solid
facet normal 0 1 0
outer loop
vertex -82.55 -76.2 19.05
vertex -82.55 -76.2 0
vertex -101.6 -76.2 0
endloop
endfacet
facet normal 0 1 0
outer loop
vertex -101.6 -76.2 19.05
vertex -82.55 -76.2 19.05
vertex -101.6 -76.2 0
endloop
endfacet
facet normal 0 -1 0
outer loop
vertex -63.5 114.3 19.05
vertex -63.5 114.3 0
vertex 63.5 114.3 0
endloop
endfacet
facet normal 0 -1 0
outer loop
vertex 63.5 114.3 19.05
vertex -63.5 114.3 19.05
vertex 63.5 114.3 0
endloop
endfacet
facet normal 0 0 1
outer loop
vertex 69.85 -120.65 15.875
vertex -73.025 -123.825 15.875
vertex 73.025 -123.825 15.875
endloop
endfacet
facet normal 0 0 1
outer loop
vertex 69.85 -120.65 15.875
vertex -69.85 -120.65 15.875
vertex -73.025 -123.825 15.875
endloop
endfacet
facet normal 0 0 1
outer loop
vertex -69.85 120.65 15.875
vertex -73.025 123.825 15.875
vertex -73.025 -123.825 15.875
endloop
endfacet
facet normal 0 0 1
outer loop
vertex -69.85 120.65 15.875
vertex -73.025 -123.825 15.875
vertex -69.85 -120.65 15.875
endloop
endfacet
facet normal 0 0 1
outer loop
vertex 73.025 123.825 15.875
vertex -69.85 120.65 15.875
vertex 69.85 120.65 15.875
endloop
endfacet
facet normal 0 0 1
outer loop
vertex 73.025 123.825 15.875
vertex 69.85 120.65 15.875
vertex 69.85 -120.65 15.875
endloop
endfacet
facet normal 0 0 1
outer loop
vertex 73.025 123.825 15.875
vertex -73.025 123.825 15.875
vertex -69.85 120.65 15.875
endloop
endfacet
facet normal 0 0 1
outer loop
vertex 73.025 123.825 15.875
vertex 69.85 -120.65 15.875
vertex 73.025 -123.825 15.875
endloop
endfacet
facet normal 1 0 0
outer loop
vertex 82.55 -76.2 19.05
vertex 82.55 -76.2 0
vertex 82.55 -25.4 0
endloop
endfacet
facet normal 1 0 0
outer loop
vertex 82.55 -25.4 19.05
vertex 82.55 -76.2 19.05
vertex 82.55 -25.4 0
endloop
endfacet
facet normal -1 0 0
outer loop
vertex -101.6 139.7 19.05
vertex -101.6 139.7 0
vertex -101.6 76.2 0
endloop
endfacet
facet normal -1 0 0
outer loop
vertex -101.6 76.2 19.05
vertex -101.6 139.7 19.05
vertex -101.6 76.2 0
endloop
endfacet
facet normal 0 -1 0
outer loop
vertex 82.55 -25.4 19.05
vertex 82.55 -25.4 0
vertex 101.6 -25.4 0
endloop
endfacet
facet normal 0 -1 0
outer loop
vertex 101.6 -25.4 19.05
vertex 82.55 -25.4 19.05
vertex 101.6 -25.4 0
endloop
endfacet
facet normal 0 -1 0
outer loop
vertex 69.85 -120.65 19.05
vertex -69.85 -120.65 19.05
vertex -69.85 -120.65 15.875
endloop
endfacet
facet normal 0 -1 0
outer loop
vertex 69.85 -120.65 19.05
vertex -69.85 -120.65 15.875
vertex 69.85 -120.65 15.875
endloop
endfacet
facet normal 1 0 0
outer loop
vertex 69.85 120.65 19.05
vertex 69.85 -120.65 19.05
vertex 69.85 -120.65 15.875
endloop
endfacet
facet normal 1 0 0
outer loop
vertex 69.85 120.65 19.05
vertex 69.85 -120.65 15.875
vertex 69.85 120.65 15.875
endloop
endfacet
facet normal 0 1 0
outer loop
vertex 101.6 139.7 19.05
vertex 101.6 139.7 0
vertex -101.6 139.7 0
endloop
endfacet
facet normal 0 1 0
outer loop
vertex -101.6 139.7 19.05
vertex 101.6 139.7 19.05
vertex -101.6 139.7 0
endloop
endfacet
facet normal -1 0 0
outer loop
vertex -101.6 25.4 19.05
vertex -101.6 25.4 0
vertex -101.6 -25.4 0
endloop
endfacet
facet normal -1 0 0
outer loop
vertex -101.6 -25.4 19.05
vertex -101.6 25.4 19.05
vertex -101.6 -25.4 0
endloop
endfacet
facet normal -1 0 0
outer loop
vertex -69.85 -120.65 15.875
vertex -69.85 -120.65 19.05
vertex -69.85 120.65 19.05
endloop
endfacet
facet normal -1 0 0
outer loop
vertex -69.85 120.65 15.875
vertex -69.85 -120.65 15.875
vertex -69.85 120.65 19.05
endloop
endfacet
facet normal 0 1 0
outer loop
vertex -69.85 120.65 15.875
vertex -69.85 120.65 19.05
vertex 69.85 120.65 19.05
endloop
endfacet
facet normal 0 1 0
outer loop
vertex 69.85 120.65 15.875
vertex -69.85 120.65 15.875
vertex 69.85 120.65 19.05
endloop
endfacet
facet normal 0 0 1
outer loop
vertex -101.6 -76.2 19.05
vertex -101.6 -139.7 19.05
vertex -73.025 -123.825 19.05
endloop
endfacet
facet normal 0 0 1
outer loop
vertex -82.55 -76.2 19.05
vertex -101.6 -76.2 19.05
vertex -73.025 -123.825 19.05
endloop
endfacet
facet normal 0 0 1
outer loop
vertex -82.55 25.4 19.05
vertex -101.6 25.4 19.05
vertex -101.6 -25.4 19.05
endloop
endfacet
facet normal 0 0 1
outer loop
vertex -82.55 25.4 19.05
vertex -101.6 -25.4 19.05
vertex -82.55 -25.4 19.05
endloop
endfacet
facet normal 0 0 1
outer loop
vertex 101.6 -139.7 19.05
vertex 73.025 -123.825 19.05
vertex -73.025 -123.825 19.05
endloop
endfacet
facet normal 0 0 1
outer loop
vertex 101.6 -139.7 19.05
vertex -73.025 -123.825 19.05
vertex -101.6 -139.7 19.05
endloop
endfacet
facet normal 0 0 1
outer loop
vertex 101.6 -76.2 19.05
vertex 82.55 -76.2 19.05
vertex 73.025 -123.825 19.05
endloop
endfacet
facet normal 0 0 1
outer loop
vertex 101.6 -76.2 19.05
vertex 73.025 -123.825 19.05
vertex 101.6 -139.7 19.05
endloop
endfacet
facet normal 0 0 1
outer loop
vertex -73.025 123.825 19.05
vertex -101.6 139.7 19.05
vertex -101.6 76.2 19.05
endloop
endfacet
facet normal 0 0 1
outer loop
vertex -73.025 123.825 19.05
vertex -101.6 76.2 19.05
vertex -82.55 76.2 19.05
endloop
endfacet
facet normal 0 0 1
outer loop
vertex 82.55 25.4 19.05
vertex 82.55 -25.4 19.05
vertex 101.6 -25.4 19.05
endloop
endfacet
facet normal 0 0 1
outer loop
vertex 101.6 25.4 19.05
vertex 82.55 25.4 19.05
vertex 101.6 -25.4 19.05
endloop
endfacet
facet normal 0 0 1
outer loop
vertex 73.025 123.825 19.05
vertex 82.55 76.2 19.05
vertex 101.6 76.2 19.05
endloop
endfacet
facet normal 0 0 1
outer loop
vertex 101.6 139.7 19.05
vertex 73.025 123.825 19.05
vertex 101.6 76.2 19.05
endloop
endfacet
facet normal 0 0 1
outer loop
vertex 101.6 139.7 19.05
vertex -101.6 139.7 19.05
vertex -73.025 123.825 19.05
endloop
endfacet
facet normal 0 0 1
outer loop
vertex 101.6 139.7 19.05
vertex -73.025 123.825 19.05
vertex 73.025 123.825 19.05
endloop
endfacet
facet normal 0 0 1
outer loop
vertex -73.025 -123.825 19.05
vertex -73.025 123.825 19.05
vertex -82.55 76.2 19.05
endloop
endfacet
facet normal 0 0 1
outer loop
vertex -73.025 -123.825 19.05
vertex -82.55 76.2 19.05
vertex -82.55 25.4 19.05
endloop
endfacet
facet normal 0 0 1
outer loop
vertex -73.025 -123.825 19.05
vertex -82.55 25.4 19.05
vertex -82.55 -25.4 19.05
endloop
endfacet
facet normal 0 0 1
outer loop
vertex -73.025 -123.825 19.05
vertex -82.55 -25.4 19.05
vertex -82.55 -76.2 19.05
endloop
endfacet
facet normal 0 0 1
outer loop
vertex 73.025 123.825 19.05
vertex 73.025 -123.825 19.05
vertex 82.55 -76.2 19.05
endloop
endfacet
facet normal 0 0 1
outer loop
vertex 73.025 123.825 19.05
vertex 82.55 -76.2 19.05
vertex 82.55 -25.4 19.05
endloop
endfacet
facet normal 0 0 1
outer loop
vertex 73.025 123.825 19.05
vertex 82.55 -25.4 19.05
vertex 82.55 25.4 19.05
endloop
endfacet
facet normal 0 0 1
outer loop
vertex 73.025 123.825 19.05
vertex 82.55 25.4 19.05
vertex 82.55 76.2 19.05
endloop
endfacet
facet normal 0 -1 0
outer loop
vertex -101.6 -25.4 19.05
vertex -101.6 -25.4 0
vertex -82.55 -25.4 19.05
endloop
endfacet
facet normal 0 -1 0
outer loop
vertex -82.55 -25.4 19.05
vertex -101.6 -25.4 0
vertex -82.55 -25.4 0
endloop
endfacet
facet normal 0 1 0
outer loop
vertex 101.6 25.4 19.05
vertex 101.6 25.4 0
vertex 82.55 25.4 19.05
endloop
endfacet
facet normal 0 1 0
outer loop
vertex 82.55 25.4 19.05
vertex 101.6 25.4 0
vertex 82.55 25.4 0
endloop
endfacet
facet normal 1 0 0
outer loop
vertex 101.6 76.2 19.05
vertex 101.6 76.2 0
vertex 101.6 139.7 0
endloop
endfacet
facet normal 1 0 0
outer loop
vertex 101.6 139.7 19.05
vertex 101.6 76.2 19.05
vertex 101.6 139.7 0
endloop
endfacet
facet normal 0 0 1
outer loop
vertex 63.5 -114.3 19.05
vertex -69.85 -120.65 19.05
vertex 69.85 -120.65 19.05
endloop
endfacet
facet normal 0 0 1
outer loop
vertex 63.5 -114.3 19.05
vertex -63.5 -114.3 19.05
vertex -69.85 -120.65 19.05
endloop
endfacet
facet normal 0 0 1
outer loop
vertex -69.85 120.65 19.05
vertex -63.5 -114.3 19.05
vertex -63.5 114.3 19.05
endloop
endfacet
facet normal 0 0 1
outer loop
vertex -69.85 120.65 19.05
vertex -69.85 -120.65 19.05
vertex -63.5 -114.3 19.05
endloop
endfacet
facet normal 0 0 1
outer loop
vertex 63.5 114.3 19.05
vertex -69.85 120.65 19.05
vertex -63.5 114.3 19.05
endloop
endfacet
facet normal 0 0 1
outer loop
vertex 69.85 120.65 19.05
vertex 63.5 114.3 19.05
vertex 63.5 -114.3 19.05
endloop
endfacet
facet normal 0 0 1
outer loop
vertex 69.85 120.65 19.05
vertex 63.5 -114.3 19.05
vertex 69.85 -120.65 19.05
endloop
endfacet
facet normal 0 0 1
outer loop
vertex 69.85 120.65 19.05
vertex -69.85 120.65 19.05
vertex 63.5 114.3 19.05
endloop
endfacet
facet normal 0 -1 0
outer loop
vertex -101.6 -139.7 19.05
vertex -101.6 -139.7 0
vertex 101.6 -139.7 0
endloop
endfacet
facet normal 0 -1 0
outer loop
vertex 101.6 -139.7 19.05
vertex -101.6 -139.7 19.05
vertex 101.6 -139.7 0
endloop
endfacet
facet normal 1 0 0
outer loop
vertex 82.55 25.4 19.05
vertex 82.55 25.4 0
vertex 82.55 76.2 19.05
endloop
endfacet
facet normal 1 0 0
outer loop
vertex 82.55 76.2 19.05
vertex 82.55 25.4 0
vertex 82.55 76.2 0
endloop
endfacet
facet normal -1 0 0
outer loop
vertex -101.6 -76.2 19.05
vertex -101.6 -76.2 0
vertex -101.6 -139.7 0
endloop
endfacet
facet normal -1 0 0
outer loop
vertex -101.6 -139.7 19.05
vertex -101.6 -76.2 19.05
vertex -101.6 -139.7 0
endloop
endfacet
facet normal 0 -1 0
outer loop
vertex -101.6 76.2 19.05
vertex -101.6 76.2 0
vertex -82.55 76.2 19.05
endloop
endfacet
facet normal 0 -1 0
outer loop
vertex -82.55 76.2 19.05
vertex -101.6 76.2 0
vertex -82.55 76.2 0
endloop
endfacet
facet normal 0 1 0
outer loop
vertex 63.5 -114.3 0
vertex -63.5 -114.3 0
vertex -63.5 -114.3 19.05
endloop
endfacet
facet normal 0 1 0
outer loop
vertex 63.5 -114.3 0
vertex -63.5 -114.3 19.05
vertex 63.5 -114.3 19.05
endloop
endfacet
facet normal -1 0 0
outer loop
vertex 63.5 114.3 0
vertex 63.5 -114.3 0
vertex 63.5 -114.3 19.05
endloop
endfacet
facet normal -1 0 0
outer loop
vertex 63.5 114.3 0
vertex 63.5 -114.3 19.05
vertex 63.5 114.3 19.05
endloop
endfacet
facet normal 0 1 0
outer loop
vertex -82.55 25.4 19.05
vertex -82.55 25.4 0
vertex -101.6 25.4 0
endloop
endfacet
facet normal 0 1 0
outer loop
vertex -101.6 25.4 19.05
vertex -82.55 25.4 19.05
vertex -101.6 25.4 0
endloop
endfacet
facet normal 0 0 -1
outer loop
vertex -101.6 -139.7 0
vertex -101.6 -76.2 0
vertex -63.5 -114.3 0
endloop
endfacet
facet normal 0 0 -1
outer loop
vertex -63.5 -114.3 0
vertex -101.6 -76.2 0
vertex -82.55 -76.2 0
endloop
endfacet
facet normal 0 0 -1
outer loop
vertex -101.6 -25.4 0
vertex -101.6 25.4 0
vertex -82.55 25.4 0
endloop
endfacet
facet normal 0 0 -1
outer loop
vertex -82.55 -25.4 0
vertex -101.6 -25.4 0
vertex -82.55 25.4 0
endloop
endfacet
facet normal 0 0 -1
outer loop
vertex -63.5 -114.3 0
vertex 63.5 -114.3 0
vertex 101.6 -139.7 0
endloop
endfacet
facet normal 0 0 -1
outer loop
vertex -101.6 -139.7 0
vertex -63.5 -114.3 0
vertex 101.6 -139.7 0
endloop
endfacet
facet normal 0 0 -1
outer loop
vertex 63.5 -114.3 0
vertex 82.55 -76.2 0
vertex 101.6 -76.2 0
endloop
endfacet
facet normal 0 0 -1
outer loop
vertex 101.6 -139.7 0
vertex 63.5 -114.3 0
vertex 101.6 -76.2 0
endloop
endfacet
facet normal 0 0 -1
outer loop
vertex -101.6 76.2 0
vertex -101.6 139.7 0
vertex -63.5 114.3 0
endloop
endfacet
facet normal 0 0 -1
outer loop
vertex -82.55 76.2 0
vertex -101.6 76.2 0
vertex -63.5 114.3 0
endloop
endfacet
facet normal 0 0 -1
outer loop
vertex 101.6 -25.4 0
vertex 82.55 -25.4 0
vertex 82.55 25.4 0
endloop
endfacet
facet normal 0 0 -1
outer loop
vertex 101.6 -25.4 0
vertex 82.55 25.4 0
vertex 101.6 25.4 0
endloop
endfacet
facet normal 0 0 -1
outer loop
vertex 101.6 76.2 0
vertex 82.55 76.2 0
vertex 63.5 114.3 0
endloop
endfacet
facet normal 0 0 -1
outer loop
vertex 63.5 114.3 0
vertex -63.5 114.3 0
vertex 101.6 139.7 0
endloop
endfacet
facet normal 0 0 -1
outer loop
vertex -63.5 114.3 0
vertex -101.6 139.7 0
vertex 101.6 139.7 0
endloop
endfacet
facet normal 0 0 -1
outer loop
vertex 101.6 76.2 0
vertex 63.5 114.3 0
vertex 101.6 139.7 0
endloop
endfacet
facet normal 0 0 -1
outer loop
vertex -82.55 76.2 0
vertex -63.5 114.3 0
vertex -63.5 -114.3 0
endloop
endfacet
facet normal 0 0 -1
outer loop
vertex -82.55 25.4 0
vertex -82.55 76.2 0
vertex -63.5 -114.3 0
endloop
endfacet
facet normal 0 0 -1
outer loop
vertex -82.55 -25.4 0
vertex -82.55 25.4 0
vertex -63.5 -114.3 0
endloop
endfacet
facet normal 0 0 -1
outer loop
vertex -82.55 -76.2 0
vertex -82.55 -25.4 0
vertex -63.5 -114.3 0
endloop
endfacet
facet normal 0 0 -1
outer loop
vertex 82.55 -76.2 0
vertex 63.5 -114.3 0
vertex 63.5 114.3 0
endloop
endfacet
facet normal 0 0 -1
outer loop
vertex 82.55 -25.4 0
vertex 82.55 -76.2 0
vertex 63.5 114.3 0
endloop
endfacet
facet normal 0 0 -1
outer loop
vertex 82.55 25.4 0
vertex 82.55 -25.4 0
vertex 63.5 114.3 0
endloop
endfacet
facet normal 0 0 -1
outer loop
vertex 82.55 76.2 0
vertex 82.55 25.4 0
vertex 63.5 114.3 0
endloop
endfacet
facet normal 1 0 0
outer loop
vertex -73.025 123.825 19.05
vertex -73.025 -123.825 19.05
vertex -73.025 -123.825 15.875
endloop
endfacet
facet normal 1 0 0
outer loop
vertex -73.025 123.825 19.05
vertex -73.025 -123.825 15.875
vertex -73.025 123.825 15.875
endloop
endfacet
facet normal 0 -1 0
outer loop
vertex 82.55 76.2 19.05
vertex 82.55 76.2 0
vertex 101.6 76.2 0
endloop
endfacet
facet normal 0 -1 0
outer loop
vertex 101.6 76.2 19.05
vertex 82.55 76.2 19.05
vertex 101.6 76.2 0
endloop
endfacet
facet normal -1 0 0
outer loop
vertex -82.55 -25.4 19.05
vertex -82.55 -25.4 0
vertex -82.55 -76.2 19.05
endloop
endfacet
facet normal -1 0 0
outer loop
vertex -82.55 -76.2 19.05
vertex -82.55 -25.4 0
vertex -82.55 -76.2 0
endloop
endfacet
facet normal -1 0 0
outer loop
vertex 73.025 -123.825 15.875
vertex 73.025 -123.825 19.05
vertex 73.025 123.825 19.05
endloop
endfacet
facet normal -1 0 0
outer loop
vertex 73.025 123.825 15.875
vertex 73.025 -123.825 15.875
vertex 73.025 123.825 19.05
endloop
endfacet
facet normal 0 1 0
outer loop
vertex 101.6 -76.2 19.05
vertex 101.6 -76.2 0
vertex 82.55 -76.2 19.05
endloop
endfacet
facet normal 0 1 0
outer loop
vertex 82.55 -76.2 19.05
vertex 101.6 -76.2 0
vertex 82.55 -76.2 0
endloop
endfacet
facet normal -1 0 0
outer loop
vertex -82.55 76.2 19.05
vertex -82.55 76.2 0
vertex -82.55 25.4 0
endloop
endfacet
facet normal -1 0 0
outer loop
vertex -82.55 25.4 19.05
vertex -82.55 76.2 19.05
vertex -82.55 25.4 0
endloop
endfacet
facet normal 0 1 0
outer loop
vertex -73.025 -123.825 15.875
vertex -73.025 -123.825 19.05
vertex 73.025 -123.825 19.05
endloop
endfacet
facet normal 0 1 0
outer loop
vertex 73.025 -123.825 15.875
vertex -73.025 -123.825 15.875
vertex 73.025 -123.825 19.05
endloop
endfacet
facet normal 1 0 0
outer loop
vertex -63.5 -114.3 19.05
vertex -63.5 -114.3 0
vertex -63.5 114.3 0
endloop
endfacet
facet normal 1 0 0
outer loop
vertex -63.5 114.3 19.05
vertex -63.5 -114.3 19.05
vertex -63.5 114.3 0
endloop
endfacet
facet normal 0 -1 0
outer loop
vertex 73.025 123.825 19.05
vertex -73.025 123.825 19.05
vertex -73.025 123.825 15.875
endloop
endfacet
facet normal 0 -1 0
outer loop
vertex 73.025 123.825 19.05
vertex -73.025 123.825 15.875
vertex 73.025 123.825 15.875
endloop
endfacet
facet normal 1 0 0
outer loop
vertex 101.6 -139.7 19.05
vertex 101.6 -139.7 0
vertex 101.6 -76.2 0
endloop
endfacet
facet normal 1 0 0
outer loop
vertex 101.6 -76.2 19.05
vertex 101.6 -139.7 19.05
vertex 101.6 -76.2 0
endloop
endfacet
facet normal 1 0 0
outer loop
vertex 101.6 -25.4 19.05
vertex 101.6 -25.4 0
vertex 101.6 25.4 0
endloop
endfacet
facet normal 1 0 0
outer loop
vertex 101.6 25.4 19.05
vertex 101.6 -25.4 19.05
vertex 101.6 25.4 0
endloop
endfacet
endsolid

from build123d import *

# Parameters (mm, degrees)
F0_W     = 127
F0_H     = 228.6
F1_DEPTH = 19.05
F2_W     = 146.05
F2_H     = 247.65
F2_W_2   = 139.7
F2_H_2   = 241.3
F3_DEPTH = 3.175


with BuildPart() as f1:
    # F0 (on Top) → F1 (new body)
    with BuildSketch(Plane.XY):
        Polygon((101.6, 139.7), (-101.6, 139.7), (-101.6, 76.2), (-82.55, 76.2), (-82.55, 25.4), (-101.6, 25.4), (-101.6, -25.4), (-82.55, -25.4), (-82.55, -76.2), (-101.6, -76.2), (-101.6, -139.7), (101.6, -139.7), (101.6, -76.2), (82.55, -76.2), (82.55, -25.4), (101.6, -25.4), (101.6, 25.4), (82.55, 25.4), (82.55, 76.2), (101.6, 76.2), align=None)
        Rectangle(F0_W, F0_H, mode=Mode.SUBTRACT)
    extrude(amount=F1_DEPTH)

    # F2 (on face) → F3 (cut)
    with BuildSketch(Plane.XY.offset(19.05)):
        Rectangle(F2_W, F2_H)
        Rectangle(F2_W_2, F2_H_2, mode=Mode.SUBTRACT)
    extrude(amount=-F3_DEPTH, mode=Mode.SUBTRACT)


solid = f1.part
